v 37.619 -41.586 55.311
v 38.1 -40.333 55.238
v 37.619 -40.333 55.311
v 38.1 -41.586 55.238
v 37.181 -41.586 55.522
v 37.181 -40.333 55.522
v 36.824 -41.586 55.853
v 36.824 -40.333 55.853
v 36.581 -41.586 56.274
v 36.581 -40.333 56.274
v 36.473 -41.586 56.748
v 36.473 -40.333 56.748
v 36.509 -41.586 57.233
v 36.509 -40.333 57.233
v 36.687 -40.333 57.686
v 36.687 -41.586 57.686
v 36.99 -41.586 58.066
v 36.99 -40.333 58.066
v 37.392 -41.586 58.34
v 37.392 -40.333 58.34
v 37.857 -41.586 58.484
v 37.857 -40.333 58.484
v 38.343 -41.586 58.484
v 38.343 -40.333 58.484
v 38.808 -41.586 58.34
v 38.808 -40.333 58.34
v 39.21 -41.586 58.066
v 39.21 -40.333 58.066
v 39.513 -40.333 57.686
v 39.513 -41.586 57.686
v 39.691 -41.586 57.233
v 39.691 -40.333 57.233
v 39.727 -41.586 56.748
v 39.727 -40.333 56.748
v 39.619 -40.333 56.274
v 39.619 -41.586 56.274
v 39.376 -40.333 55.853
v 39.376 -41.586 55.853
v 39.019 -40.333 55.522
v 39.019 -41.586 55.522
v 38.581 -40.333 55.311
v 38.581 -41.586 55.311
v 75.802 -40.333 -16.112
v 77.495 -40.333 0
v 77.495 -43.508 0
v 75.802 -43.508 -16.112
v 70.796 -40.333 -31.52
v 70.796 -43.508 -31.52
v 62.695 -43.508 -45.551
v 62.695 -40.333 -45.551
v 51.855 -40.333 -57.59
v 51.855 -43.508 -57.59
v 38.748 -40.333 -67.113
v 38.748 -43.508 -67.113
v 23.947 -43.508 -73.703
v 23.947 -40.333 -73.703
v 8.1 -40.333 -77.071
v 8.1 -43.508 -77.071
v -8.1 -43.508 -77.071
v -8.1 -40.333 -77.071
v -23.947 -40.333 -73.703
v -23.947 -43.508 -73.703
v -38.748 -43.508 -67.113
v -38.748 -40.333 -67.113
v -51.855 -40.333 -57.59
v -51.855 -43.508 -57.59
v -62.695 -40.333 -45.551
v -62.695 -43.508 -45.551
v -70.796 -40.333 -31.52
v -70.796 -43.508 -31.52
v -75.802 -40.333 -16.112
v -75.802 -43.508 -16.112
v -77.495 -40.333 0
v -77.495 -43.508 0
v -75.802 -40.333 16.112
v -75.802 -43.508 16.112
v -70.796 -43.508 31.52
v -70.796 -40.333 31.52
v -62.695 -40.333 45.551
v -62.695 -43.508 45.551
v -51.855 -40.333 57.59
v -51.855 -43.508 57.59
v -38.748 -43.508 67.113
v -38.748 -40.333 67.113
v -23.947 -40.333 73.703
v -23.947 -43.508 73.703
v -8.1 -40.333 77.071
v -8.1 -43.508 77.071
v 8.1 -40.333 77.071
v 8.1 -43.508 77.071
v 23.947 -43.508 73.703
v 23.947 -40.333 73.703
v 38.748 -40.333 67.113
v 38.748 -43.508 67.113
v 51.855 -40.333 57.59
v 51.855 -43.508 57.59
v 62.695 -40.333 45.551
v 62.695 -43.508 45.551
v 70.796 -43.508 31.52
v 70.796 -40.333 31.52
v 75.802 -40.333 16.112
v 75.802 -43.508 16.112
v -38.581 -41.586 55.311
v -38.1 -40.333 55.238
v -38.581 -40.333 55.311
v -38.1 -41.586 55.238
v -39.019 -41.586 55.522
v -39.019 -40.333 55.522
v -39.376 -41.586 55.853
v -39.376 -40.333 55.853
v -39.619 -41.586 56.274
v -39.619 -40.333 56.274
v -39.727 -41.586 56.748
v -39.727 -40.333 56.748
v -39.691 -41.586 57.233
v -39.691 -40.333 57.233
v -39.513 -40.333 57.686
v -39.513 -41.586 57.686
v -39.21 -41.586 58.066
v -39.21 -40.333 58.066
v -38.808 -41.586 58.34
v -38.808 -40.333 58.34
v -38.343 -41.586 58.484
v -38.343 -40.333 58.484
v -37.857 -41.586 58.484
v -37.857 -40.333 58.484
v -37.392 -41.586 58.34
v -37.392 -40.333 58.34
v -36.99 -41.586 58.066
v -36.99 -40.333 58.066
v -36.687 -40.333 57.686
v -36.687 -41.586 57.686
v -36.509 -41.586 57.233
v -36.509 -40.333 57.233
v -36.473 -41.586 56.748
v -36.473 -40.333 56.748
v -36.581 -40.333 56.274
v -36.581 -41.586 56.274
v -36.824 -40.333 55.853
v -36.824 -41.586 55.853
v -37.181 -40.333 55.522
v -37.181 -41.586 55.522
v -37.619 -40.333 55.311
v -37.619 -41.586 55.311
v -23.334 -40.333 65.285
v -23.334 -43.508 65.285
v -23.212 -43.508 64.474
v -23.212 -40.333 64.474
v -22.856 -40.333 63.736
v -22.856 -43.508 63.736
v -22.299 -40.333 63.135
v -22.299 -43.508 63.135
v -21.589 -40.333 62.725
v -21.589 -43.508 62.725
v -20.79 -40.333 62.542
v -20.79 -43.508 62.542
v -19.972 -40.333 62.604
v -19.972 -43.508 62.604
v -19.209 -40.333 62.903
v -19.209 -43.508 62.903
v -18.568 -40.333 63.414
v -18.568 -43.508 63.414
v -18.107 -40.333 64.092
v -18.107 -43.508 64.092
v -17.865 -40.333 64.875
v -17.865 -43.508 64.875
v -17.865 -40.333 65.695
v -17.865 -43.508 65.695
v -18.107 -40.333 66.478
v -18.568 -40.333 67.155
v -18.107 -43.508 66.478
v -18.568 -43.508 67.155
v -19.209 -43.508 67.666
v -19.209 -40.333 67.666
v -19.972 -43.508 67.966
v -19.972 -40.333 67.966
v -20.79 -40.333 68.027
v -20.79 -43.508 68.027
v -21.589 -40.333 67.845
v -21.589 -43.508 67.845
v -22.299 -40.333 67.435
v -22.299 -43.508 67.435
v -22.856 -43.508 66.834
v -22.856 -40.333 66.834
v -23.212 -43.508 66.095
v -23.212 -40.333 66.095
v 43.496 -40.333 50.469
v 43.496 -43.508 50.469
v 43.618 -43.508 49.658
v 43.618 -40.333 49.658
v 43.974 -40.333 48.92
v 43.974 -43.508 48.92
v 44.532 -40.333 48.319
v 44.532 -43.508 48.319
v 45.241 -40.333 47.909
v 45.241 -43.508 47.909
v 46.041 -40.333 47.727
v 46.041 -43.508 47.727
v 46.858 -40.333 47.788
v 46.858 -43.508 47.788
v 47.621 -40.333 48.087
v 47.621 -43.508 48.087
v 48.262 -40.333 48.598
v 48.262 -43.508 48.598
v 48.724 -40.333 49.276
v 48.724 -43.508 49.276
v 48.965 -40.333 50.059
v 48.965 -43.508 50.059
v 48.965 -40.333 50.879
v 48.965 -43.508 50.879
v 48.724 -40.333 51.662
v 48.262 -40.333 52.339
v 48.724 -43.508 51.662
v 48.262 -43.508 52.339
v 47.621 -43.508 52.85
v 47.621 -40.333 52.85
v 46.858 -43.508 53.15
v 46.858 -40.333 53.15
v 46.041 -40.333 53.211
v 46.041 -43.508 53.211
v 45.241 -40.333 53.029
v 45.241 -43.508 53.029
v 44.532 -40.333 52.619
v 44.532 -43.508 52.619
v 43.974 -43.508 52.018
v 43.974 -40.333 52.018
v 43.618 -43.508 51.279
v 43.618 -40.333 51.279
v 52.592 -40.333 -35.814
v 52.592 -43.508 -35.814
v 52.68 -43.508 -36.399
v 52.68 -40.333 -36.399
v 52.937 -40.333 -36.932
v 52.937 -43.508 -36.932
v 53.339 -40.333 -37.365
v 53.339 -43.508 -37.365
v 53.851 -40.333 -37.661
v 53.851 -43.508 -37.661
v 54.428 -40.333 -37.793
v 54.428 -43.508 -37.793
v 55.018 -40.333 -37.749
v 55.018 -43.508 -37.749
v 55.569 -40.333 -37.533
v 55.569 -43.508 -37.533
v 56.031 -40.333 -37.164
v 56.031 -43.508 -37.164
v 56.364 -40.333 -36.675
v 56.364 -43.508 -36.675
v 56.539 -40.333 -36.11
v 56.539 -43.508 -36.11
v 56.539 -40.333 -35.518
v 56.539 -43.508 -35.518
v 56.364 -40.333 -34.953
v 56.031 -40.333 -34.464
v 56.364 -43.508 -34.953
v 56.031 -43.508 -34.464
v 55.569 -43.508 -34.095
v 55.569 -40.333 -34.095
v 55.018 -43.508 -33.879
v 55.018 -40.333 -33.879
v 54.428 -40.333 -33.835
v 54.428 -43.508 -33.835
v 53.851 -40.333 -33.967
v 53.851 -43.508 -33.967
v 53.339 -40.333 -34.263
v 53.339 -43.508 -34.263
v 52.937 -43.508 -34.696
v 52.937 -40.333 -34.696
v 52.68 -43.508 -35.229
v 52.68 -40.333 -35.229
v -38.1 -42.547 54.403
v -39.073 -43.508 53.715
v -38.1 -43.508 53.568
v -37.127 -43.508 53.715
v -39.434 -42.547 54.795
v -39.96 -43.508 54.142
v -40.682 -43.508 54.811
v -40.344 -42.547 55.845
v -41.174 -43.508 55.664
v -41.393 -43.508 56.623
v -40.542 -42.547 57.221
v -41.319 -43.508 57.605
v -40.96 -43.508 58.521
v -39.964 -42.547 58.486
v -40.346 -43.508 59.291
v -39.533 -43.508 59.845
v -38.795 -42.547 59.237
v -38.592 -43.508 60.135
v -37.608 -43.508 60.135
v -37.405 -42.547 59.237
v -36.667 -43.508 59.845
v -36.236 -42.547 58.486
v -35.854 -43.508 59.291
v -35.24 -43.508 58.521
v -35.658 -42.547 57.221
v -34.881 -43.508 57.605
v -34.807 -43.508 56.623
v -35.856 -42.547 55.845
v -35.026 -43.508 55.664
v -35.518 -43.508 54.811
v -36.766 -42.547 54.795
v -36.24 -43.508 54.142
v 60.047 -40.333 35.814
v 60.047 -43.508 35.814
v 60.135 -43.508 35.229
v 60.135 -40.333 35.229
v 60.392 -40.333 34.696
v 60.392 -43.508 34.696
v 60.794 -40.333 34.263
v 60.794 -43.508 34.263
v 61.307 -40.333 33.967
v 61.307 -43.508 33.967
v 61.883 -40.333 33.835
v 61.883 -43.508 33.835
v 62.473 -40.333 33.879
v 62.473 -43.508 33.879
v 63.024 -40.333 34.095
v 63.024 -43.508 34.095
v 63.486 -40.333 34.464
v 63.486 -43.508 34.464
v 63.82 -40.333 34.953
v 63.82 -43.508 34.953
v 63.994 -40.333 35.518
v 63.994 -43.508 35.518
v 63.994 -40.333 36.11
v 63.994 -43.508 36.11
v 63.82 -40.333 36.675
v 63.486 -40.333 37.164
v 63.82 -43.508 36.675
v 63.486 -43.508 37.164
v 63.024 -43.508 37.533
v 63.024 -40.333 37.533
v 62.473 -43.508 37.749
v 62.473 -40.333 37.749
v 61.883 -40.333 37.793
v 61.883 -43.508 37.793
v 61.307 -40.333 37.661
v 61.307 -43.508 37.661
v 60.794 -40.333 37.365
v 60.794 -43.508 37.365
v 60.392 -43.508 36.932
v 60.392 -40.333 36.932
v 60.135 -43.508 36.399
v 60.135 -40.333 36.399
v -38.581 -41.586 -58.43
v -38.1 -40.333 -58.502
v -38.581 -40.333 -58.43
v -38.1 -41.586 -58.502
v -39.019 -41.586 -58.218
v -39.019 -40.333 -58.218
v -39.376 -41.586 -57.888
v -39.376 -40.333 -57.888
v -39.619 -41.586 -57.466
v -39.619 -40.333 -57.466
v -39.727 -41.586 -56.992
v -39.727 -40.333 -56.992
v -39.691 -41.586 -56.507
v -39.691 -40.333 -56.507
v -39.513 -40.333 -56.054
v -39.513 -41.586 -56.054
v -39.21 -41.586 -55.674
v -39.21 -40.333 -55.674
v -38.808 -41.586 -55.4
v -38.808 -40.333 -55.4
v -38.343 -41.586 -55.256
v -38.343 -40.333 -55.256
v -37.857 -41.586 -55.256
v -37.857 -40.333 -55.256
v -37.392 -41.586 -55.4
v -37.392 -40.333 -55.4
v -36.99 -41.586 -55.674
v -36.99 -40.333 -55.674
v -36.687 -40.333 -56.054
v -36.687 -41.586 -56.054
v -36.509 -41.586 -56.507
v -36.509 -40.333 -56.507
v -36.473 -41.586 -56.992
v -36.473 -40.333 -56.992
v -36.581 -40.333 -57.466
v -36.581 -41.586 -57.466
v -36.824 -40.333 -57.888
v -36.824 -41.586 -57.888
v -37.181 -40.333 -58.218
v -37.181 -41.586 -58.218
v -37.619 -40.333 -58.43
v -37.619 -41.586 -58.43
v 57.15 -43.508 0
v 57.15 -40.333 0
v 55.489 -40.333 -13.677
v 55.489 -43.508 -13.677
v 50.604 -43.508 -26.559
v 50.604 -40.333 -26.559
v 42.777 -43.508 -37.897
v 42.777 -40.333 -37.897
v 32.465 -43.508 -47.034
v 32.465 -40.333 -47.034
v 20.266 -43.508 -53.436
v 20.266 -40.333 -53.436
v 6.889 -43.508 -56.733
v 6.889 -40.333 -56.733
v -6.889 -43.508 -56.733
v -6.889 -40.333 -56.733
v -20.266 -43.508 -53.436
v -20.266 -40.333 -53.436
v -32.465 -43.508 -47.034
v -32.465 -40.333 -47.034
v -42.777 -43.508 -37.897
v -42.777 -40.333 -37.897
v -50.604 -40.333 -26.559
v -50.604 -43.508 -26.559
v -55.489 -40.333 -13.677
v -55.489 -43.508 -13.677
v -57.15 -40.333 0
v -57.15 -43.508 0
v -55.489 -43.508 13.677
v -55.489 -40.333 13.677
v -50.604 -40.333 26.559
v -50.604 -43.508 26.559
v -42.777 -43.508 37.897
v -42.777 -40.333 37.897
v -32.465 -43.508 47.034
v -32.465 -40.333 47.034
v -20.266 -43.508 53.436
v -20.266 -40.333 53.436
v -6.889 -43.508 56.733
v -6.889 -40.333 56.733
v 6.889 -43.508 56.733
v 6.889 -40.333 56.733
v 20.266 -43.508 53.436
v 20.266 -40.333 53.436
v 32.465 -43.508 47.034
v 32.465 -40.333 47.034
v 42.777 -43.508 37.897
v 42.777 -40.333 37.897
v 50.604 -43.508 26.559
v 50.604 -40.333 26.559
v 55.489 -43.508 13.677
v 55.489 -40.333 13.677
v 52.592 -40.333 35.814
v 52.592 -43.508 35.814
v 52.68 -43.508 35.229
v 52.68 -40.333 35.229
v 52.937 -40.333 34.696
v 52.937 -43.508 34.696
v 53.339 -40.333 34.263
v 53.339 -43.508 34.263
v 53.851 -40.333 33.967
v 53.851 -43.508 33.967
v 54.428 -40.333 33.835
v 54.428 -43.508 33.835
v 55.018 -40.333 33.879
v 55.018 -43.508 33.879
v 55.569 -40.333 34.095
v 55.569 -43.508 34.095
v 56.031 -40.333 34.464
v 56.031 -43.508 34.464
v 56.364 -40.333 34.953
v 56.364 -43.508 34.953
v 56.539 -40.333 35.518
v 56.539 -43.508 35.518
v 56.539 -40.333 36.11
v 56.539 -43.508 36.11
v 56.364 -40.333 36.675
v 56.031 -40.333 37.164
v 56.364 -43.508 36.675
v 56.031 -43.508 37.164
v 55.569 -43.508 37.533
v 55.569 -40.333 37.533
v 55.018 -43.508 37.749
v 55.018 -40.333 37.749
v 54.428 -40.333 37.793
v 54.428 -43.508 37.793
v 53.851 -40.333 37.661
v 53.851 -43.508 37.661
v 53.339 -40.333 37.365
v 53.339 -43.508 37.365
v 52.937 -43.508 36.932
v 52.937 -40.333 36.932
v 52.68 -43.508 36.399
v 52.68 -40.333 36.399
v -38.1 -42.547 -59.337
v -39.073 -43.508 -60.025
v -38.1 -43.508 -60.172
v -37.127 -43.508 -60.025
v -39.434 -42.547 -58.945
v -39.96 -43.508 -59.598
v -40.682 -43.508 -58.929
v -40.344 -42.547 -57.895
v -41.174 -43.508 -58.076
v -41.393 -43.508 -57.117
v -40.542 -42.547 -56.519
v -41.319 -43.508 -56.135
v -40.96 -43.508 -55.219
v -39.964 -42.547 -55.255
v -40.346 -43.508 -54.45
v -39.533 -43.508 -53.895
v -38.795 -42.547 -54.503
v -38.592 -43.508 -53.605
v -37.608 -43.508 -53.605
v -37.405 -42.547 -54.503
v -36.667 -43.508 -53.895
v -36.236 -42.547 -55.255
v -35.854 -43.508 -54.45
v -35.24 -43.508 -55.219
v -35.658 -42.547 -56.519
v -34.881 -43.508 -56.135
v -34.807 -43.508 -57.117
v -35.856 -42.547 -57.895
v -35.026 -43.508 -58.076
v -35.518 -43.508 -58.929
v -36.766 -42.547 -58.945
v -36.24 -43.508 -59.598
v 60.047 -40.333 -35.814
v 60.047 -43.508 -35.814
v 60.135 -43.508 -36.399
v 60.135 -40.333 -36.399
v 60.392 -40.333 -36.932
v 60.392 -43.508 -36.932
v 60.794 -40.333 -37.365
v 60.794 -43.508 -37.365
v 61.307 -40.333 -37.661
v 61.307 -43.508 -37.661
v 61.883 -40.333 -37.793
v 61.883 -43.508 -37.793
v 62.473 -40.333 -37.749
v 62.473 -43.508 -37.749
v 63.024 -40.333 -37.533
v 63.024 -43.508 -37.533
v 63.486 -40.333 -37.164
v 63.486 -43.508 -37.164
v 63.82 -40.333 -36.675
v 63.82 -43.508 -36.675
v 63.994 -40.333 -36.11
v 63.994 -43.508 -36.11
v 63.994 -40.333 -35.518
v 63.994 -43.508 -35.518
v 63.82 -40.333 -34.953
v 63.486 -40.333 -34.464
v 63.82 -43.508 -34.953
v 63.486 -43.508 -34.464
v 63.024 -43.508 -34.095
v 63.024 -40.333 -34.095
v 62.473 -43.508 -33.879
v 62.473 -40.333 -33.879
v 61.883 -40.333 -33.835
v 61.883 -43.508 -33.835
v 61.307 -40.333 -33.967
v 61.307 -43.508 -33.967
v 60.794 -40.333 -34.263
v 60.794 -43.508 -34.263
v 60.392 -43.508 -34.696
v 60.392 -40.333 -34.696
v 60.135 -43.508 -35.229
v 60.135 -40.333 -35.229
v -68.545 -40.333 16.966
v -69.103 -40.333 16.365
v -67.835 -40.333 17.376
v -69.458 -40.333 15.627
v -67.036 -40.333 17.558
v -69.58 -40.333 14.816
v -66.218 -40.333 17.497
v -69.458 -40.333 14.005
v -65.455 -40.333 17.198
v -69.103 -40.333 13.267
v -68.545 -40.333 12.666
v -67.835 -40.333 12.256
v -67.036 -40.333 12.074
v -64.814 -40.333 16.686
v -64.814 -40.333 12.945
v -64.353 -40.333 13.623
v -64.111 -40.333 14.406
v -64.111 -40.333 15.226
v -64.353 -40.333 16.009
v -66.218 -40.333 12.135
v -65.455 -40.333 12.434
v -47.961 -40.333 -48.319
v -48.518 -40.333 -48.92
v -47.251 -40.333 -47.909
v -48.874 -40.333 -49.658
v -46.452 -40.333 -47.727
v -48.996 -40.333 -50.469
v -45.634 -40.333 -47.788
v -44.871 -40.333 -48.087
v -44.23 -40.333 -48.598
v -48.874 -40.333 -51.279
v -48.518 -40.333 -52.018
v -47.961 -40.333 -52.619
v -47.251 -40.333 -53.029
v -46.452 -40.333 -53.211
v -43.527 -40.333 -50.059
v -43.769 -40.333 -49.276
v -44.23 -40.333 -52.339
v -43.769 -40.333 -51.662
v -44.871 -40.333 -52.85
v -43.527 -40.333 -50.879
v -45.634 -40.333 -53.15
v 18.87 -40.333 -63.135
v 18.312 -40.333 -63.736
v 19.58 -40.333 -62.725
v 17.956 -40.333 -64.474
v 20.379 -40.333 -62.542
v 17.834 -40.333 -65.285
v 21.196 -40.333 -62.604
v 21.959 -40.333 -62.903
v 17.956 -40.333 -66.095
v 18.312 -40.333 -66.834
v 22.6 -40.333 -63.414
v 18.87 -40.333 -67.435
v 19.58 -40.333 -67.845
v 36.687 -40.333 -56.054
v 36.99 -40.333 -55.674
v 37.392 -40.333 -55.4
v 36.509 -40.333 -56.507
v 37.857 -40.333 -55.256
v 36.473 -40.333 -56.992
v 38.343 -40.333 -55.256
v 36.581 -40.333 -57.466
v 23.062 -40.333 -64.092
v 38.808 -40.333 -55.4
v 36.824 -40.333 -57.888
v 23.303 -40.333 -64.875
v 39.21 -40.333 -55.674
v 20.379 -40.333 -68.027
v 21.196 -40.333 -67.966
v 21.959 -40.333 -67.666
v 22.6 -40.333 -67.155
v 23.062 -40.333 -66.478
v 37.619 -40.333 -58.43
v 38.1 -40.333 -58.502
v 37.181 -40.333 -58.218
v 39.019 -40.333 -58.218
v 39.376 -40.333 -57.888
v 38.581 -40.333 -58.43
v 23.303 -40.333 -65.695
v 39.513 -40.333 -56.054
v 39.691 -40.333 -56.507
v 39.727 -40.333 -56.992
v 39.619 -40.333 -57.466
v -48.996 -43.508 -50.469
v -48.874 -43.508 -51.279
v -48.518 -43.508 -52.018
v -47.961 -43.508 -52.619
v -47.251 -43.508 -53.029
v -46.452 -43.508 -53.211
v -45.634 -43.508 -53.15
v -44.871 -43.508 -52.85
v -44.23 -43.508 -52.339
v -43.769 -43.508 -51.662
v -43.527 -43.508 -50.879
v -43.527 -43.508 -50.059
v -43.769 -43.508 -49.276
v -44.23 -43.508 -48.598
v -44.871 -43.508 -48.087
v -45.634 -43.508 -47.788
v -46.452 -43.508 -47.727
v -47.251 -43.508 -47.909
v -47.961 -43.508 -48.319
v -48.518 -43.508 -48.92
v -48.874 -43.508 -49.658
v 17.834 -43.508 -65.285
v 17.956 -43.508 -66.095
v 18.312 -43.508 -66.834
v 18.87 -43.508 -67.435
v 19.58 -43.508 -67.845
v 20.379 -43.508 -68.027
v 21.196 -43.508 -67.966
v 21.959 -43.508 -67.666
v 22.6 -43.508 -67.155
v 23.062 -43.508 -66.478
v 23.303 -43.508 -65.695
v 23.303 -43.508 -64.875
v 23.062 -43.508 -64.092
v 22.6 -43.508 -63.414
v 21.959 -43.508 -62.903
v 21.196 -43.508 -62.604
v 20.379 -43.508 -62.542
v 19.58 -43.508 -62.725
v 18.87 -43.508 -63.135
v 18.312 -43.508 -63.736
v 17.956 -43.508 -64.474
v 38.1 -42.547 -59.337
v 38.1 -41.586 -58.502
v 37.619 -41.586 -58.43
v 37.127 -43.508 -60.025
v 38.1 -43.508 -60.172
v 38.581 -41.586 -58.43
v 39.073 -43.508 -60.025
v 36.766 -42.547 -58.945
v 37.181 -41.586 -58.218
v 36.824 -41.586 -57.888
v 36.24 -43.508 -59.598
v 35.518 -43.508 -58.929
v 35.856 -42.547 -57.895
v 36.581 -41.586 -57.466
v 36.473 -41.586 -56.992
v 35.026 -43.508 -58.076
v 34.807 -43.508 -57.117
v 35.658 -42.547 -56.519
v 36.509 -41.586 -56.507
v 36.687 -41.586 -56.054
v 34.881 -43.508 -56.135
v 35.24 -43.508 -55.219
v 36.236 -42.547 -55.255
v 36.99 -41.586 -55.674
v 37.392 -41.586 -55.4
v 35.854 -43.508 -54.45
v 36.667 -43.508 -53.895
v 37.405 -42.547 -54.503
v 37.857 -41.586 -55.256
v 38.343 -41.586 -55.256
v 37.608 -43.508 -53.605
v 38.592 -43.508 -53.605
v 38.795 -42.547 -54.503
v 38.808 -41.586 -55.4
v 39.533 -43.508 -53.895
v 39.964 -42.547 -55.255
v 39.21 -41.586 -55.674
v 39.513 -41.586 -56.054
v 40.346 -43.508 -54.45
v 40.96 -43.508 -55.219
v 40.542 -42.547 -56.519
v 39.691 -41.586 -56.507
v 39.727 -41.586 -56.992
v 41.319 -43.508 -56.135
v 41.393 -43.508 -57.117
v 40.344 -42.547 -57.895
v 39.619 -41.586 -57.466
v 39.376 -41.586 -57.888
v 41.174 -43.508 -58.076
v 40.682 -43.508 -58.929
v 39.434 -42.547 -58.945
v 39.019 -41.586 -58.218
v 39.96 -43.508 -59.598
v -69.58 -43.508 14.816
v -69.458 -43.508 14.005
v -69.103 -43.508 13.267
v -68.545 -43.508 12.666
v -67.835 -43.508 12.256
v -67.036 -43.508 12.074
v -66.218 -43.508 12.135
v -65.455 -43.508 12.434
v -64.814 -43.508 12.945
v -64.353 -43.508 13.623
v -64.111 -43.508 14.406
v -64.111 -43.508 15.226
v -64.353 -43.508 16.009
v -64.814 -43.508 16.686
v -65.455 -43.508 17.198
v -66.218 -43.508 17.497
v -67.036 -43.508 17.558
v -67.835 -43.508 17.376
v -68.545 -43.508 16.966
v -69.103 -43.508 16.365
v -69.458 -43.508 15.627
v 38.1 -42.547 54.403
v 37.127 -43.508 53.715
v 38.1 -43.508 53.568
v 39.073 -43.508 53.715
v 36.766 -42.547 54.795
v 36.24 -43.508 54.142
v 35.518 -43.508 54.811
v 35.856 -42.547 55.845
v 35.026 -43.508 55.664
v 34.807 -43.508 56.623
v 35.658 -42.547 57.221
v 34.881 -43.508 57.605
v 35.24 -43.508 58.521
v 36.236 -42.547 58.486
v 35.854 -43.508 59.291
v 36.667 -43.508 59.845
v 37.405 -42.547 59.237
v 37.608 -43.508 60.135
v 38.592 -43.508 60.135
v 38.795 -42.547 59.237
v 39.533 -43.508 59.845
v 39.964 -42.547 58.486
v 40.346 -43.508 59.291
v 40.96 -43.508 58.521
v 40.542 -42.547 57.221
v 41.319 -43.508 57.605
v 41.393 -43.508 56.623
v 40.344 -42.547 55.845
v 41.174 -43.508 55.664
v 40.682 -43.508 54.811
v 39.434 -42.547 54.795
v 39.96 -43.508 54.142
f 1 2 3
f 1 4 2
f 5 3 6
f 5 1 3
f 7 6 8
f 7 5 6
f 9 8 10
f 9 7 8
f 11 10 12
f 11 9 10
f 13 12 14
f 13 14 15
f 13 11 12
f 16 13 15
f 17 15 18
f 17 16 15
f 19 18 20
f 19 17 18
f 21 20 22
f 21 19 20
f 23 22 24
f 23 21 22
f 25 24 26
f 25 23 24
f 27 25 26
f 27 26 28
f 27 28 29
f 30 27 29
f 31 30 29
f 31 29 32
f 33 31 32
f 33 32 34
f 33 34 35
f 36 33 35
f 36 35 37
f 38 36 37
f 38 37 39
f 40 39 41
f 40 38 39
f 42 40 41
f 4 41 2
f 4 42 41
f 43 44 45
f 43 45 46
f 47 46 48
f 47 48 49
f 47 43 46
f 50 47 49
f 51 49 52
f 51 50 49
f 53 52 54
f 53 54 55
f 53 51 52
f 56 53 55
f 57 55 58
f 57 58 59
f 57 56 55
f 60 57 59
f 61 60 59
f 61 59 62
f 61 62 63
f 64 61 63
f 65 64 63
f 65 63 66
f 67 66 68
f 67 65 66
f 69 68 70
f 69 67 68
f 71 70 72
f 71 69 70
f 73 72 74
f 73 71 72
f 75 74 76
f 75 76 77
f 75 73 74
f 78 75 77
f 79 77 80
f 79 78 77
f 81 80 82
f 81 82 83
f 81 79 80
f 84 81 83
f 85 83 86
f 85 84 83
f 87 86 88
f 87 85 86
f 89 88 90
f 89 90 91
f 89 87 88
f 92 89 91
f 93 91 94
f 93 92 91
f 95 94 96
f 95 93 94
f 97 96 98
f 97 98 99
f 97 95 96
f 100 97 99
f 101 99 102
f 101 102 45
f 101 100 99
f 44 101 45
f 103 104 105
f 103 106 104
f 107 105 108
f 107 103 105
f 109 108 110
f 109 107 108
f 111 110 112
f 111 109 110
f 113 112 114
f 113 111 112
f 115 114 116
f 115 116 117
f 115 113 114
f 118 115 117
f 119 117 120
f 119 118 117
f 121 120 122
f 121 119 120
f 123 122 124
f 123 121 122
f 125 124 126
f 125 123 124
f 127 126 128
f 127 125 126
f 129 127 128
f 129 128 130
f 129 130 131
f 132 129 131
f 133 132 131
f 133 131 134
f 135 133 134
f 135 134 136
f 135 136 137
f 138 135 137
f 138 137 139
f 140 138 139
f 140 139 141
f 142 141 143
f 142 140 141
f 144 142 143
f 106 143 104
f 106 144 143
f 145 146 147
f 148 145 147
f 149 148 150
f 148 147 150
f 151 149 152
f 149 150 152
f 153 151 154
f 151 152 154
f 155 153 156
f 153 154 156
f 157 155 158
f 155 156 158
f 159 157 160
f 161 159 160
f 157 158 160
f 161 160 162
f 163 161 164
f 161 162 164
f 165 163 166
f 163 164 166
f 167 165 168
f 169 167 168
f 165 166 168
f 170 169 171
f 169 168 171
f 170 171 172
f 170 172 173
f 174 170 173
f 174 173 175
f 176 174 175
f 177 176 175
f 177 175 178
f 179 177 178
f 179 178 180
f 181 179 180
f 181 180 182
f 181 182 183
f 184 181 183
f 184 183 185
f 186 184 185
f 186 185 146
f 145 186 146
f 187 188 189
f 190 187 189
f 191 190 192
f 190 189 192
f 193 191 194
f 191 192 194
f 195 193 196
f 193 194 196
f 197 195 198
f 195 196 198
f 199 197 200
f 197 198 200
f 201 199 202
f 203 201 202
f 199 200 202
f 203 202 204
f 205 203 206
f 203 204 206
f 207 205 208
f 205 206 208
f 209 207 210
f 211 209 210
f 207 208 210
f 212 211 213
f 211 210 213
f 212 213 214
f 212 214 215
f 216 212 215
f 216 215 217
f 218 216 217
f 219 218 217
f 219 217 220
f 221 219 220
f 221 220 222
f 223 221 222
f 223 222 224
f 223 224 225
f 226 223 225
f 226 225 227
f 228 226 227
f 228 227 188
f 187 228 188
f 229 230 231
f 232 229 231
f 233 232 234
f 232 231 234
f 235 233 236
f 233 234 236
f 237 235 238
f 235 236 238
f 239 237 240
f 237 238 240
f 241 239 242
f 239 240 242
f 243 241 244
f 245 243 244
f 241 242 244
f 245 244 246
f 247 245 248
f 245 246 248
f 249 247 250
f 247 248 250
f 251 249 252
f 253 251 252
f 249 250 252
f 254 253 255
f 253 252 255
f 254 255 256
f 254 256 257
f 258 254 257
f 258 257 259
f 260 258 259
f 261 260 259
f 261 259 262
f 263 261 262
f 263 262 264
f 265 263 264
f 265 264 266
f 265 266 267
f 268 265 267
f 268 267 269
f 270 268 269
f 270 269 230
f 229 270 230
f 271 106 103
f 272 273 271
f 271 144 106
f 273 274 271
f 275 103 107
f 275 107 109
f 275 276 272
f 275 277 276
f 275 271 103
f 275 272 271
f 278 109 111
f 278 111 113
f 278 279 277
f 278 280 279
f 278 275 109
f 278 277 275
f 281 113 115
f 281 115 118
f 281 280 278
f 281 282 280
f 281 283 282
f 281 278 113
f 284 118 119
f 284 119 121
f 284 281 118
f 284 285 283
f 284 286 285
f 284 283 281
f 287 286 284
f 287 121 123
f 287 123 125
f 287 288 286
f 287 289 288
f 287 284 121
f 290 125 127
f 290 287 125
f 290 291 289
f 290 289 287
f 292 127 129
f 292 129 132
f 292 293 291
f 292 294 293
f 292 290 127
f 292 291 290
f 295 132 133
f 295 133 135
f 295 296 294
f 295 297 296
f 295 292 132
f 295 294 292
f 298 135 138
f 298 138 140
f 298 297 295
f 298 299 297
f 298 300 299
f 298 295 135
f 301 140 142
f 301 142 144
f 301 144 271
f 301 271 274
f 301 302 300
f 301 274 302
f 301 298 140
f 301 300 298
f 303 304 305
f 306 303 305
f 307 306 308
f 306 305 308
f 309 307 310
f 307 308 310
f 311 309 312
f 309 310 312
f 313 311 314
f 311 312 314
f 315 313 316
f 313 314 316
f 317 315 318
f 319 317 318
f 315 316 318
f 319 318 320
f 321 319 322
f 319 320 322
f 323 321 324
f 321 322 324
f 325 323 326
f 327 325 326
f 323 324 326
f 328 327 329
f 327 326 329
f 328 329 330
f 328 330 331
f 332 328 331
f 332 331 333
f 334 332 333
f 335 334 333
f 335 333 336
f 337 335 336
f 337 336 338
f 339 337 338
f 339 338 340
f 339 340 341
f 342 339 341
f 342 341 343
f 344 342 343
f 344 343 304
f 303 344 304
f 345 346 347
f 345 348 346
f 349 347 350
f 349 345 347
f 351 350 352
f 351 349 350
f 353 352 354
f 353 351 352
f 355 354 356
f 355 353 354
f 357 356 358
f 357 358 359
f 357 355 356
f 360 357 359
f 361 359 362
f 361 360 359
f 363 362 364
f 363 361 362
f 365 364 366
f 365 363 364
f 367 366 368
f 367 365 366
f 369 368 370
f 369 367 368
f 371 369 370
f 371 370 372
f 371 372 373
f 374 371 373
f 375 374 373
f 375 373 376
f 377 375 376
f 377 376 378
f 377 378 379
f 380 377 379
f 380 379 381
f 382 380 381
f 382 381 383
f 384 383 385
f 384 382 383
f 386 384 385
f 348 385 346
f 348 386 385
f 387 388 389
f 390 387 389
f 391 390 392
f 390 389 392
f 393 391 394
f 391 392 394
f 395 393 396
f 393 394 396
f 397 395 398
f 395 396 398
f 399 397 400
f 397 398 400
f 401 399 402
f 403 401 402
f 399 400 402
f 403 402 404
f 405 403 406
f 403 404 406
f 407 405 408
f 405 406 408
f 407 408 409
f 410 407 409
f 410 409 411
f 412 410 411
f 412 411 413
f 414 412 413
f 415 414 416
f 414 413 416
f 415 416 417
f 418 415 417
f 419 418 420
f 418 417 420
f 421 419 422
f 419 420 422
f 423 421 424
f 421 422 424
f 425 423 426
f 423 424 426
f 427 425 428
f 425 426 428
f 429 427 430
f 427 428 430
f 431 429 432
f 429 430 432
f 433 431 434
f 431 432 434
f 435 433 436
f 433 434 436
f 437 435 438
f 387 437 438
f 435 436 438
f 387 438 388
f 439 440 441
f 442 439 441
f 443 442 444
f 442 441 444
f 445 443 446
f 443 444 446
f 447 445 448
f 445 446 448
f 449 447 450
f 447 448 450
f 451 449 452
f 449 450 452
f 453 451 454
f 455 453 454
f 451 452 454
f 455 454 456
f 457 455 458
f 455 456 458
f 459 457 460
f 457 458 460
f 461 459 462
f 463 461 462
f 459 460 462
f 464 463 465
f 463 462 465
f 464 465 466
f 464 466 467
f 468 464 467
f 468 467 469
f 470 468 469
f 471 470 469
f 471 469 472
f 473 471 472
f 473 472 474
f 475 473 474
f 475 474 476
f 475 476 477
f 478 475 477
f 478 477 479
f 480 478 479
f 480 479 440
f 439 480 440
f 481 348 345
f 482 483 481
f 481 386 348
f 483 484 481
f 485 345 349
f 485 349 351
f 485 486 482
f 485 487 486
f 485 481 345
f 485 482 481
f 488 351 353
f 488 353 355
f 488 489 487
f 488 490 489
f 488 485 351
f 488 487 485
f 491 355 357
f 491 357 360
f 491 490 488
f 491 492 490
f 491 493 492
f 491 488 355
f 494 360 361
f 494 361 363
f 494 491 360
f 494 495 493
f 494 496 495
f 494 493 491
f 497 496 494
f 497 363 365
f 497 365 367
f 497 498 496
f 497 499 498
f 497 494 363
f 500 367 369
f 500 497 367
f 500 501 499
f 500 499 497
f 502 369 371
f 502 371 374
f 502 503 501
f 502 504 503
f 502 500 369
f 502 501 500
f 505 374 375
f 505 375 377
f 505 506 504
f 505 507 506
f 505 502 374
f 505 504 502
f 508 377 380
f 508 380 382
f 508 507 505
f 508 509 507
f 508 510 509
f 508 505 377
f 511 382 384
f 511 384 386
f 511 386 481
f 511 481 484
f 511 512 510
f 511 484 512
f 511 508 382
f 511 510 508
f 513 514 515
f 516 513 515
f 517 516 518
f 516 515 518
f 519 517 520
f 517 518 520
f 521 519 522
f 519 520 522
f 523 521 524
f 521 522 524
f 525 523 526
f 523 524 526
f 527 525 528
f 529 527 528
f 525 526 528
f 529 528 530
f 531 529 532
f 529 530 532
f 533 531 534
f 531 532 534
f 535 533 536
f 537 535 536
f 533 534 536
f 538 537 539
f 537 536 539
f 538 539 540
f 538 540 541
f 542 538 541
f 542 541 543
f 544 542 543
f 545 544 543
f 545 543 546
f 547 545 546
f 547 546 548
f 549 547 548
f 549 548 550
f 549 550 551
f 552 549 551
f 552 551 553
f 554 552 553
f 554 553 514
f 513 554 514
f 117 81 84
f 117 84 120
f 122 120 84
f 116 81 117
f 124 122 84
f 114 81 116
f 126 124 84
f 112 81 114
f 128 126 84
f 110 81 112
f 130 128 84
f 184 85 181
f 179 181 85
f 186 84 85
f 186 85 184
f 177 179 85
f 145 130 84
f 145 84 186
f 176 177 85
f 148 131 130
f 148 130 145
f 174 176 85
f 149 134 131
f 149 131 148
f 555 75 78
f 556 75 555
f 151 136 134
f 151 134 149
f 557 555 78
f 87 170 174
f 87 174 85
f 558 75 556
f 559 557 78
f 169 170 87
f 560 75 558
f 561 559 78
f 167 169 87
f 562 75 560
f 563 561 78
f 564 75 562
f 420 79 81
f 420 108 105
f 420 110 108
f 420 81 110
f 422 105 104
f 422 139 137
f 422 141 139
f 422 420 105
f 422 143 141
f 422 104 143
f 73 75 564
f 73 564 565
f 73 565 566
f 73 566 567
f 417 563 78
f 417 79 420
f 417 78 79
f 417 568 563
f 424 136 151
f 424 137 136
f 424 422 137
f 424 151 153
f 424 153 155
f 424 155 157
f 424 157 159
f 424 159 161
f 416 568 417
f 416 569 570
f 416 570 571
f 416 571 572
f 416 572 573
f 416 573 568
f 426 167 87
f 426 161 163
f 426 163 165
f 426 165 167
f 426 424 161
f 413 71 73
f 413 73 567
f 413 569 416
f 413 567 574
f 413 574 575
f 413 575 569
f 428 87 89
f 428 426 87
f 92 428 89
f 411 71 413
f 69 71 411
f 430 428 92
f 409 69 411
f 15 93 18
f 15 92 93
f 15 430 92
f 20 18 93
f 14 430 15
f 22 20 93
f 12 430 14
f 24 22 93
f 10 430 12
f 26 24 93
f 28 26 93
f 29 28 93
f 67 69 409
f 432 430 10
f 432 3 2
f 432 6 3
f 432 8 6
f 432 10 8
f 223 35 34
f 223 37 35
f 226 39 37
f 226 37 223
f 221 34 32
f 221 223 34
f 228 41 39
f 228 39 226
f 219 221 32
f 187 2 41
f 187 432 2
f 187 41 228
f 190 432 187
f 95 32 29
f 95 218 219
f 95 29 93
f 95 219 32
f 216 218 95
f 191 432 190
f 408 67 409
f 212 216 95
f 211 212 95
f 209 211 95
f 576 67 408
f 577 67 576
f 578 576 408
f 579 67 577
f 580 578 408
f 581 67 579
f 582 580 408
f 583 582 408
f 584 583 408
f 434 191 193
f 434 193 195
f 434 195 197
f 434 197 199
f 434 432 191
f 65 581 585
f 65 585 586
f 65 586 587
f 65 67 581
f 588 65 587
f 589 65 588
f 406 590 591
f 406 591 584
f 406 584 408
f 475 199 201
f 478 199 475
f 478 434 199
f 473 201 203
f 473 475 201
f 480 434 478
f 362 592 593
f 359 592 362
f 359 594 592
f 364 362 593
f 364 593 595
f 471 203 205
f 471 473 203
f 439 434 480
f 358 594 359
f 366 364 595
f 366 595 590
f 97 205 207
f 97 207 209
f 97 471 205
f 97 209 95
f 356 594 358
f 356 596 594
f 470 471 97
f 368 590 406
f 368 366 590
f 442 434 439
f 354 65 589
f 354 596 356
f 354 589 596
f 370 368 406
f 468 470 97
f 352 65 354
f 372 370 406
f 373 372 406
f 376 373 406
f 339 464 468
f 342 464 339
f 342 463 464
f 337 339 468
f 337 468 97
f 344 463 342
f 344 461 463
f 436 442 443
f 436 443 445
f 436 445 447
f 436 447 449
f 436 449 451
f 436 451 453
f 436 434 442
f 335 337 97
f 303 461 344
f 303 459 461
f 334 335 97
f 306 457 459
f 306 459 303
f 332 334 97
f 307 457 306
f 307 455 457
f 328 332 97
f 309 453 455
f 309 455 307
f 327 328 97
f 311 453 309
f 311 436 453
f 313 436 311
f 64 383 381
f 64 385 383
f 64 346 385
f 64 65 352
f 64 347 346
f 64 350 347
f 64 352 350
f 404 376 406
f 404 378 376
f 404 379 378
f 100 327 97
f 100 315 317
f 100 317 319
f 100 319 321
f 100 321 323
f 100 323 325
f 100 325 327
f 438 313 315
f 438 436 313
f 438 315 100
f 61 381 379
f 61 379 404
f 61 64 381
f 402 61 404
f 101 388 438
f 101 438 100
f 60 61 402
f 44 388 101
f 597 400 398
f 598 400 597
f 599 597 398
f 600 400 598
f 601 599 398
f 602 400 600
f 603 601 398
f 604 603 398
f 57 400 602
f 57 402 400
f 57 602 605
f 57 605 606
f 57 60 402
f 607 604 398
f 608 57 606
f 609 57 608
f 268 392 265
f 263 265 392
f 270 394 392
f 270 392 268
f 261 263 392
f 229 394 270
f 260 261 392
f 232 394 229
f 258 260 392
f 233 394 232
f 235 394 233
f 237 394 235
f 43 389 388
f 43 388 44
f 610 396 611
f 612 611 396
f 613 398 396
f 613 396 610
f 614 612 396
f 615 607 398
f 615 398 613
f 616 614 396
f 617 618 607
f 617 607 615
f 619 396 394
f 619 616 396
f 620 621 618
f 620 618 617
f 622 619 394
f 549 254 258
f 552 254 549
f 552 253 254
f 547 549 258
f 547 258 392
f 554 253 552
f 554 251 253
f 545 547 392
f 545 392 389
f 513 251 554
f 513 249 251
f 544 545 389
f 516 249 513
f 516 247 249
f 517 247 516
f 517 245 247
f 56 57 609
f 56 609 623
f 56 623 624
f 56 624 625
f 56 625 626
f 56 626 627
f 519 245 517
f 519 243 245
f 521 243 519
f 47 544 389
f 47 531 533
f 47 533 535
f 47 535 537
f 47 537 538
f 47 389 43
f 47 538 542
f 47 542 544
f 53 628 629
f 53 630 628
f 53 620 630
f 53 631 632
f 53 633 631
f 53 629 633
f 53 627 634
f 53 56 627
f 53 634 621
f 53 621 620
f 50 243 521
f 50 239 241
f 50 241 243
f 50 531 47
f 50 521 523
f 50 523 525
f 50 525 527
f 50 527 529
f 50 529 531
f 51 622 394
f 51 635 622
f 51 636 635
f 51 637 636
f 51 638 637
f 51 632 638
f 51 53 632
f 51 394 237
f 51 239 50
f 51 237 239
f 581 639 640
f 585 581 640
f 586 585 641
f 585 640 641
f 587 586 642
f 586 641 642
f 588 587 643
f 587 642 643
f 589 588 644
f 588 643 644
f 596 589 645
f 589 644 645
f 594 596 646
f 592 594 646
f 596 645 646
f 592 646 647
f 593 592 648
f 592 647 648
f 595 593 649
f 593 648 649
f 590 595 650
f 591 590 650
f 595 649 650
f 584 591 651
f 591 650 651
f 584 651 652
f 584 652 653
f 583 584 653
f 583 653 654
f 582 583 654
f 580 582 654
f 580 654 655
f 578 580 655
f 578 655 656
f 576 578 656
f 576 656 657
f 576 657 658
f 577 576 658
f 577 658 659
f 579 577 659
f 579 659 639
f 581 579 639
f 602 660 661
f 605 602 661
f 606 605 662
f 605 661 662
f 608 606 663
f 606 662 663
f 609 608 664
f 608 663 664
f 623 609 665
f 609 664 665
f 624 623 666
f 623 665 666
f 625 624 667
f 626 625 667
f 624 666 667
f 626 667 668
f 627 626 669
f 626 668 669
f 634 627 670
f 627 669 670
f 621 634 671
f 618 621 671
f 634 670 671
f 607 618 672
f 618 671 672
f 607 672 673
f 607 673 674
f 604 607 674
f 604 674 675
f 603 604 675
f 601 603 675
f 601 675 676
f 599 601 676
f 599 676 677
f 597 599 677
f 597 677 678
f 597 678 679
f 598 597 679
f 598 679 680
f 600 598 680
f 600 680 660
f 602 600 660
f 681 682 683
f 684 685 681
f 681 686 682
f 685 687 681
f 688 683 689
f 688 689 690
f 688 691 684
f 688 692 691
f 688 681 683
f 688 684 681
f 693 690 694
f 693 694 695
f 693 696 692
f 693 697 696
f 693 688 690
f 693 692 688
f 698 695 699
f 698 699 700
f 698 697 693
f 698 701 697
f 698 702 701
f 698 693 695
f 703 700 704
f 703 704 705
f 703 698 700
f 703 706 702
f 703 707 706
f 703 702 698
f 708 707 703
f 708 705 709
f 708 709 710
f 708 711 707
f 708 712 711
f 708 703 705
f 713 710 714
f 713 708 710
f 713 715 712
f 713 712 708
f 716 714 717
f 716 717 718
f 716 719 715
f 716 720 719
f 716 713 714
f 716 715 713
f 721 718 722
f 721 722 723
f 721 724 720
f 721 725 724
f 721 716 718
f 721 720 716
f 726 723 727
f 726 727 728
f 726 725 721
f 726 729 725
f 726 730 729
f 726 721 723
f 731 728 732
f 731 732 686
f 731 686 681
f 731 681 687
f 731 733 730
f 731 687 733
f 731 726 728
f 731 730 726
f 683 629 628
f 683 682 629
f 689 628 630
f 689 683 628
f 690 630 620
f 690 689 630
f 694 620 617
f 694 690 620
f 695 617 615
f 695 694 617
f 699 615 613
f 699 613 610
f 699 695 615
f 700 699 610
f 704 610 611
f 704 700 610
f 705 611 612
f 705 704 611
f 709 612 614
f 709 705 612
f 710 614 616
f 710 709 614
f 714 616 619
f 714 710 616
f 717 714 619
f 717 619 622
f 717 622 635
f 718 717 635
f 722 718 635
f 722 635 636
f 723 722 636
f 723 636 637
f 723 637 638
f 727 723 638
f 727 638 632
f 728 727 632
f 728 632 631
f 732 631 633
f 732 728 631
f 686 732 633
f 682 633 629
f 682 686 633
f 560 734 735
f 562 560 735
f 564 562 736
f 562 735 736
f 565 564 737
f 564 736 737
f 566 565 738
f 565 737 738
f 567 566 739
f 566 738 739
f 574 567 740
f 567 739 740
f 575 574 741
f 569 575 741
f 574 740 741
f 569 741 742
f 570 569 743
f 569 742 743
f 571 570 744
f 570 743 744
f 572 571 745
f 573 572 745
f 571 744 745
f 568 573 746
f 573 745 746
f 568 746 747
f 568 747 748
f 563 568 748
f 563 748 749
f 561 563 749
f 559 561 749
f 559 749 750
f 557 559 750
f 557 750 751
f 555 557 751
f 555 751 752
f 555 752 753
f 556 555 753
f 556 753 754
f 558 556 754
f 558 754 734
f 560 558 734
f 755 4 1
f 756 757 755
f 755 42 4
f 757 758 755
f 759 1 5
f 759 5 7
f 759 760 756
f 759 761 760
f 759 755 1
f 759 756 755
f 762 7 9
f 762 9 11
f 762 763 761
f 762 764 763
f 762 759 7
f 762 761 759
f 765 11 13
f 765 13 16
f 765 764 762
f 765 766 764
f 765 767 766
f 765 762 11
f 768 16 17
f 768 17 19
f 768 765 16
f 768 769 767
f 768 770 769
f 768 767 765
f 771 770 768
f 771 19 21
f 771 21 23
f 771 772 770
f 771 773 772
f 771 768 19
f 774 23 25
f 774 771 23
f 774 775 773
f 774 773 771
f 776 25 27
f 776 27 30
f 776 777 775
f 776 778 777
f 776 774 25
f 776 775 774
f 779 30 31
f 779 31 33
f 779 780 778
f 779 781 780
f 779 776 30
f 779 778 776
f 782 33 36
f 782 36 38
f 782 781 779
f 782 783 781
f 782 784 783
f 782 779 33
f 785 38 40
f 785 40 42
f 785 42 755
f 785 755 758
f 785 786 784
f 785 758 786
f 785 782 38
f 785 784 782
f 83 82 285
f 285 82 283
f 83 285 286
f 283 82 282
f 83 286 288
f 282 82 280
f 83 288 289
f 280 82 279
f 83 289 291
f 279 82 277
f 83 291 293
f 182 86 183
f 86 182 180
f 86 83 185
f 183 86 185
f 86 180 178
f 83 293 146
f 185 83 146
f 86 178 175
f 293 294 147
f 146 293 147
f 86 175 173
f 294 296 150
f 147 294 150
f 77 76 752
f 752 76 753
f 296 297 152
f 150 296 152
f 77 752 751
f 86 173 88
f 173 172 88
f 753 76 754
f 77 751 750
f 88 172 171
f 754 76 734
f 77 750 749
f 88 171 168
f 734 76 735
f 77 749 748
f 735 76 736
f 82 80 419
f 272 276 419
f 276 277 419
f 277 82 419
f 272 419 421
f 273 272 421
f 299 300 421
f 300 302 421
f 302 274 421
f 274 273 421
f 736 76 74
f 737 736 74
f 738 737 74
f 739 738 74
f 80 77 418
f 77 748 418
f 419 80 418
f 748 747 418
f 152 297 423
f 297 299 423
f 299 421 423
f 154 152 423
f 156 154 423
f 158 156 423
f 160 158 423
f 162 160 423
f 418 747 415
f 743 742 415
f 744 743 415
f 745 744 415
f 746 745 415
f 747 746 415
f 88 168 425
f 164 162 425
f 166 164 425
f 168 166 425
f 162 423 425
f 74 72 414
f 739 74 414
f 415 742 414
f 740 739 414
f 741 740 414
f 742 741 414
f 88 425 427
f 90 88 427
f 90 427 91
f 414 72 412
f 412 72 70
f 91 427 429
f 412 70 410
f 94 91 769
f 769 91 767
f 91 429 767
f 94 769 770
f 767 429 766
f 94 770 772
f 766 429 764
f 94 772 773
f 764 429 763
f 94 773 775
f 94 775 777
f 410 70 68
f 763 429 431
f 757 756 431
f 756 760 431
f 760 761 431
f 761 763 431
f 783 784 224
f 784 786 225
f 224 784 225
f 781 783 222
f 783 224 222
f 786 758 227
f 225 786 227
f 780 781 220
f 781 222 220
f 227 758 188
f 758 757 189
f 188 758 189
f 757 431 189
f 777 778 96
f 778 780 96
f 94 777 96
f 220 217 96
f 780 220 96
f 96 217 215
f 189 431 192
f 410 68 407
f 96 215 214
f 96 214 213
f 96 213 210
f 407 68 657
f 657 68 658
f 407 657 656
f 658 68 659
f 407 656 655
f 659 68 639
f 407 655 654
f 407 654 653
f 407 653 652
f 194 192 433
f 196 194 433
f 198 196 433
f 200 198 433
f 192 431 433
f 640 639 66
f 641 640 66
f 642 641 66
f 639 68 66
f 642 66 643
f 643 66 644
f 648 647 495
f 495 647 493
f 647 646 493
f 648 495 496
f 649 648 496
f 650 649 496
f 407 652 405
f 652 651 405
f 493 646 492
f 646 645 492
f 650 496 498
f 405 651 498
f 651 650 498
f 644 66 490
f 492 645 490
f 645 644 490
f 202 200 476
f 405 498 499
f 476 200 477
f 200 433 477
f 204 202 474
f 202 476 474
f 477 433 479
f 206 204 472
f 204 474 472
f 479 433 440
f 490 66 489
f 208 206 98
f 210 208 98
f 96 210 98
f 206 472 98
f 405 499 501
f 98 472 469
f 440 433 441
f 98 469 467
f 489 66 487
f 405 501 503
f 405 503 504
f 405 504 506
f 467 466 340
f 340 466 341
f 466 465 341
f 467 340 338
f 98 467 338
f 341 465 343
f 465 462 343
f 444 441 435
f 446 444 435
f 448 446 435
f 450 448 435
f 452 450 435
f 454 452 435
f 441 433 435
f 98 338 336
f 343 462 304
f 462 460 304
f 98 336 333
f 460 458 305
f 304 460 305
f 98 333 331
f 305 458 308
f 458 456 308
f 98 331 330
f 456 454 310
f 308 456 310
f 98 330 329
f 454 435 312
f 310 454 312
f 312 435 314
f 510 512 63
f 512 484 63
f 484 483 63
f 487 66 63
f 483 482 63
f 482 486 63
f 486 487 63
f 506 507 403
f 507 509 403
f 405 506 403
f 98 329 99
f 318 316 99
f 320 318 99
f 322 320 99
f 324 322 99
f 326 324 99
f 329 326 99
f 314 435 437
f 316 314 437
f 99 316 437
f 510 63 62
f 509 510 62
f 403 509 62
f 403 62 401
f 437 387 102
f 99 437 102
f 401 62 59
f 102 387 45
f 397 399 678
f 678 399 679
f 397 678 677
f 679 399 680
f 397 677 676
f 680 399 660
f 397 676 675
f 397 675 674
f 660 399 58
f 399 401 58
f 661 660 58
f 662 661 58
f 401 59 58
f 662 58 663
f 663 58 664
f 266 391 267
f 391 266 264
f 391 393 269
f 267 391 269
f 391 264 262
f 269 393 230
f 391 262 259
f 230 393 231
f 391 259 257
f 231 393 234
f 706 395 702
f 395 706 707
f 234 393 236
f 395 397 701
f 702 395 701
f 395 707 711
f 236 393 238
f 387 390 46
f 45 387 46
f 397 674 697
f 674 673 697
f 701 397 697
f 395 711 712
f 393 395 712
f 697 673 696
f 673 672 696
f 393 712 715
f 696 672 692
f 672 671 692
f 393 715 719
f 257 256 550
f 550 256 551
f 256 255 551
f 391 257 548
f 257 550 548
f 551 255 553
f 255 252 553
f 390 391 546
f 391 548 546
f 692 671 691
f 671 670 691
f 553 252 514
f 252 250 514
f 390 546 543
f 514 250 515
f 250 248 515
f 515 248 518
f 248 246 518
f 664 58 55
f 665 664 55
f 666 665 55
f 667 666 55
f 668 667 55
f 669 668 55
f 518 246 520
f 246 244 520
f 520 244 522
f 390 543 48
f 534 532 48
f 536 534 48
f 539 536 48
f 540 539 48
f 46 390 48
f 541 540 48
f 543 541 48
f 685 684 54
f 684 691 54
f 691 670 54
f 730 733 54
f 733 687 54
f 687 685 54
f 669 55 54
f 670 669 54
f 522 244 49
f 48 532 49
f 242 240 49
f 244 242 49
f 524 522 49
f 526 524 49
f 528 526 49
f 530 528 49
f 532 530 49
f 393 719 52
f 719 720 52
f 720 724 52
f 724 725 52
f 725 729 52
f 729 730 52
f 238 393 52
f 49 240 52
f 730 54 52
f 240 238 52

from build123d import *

# Parameters (mm, degrees)
GEMINI_SKIRT_F_2_R                            = 77.4954
GEMINI_SKIRT_F_2_R_2                          = 57.15
GEMINI_SKIRT_F_DEPTH                          = 3.175
M5_CLEARANCE_HOLE1_D                          = 5.5
M5_CLEARANCE_HOLE1_DEPTH                      = 3.175
CSK_FOR_4_FLAT_HEAD_MACHINE_SCREW1_AT_2_COUNT = 2
CSK_FOR_4_FLAT_HEAD_MACHINE_SCREW1_AT_2_PITCH = 76.2
CSK_FOR_4_FLAT_HEAD_MACHINE_SCREW1_AT_3_COUNT = 2
CSK_FOR_4_FLAT_HEAD_MACHINE_SCREW1_AT_3_PITCH = 113.740110937
CSK_FOR_4_FLAT_HEAD_MACHINE_SCREW1_AT_4_COUNT = 2
CSK_FOR_4_FLAT_HEAD_MACHINE_SCREW1_AT_4_PITCH = 136.906
F_5_32_0_15625_DIAMETER_HOLE1_D               = 3.96875
F_5_32_0_15625_DIAMETER_HOLE1_DEPTH           = 3.175


with BuildPart() as part:
    # GEMINI_SKIRT-F 2 → GEMINI_SKIRT_F (new body)
    with BuildSketch(Plane(origin=(0, -40.33266, 0), x_dir=(1, 0, 0), z_dir=(0, 1, 0))):
        Circle(GEMINI_SKIRT_F_2_R)
        Circle(GEMINI_SKIRT_F_2_R_2, mode=Mode.SUBTRACT)
    extrude(amount=-GEMINI_SKIRT_F_DEPTH)

    # M5 Clearance Hole1
    with Locations(Plane(origin=(0, -40.33266, 0), x_dir=(1, 0, 0), z_dir=(0, 1, 0))):
        with Locations((20.584214093, 65.28478643), (46.246176482, -50.468845537), (-20.584214093, -65.28478643), (-46.246176482, 50.468845537), (-66.830390575, -14.815940893)):
            Hole(M5_CLEARANCE_HOLE1_D / 2, depth=M5_CLEARANCE_HOLE1_DEPTH)

    # Sketch8 → CSK for #4 Flat Head Machine Screw1 (revolve, cut)
    with BuildSketch(Plane(origin=(38.1, -43.50766, -56.870055469), x_dir=(0, 0, -1), z_dir=(1, 0, 0))):
        Polygon((0, 0), (0, 3.175), (1.63195, 3.175), (1.63195, 1.921172758), (3.302, 0), align=None)
    csk_for_4_flat_head_machine_screw1 = revolve(axis=Axis((38.1, -49.85766, -56.870055469), (0, 1, 0)), mode=Mode.SUBTRACT)

    # CSK for #4 Flat Head Machine Screw1 at 2: CSK for #4 Flat Head Machine Screw1 ×2
    with Locations(*[(-i * CSK_FOR_4_FLAT_HEAD_MACHINE_SCREW1_AT_2_PITCH, 0, 0) for i in range(1, CSK_FOR_4_FLAT_HEAD_MACHINE_SCREW1_AT_2_COUNT)]):
        add(csk_for_4_flat_head_machine_screw1, mode=Mode.SUBTRACT)

    # CSK for #4 Flat Head Machine Screw1 at 3: CSK for #4 Flat Head Machine Screw1 ×2
    with Locations(*[(0, 0, i * CSK_FOR_4_FLAT_HEAD_MACHINE_SCREW1_AT_3_PITCH) for i in range(1, CSK_FOR_4_FLAT_HEAD_MACHINE_SCREW1_AT_3_COUNT)]):
        add(csk_for_4_flat_head_machine_screw1, mode=Mode.SUBTRACT)

    # CSK for #4 Flat Head Machine Screw1 at 4: CSK for #4 Flat Head Machine Screw1 ×2
    with Locations(*[Vector(-0.556586271, 0, 0.830789819) * (i * CSK_FOR_4_FLAT_HEAD_MACHINE_SCREW1_AT_4_PITCH) for i in range(1, CSK_FOR_4_FLAT_HEAD_MACHINE_SCREW1_AT_4_COUNT)]):
        add(csk_for_4_flat_head_machine_screw1, mode=Mode.SUBTRACT)

    # 5/32 (0.15625) Diameter Hole1
    with Locations(Plane(origin=(0, -40.33266, 0), x_dir=(1, 0, 0), z_dir=(0, 1, 0))):
        with Locations((62.031667622, -35.814), (54.576319847, -35.814), (54.576319847, 35.814), (62.031667622, 35.814)):
            Hole(F_5_32_0_15625_DIAMETER_HOLE1_D / 2, depth=F_5_32_0_15625_DIAMETER_HOLE1_DEPTH)


solid = part.part
